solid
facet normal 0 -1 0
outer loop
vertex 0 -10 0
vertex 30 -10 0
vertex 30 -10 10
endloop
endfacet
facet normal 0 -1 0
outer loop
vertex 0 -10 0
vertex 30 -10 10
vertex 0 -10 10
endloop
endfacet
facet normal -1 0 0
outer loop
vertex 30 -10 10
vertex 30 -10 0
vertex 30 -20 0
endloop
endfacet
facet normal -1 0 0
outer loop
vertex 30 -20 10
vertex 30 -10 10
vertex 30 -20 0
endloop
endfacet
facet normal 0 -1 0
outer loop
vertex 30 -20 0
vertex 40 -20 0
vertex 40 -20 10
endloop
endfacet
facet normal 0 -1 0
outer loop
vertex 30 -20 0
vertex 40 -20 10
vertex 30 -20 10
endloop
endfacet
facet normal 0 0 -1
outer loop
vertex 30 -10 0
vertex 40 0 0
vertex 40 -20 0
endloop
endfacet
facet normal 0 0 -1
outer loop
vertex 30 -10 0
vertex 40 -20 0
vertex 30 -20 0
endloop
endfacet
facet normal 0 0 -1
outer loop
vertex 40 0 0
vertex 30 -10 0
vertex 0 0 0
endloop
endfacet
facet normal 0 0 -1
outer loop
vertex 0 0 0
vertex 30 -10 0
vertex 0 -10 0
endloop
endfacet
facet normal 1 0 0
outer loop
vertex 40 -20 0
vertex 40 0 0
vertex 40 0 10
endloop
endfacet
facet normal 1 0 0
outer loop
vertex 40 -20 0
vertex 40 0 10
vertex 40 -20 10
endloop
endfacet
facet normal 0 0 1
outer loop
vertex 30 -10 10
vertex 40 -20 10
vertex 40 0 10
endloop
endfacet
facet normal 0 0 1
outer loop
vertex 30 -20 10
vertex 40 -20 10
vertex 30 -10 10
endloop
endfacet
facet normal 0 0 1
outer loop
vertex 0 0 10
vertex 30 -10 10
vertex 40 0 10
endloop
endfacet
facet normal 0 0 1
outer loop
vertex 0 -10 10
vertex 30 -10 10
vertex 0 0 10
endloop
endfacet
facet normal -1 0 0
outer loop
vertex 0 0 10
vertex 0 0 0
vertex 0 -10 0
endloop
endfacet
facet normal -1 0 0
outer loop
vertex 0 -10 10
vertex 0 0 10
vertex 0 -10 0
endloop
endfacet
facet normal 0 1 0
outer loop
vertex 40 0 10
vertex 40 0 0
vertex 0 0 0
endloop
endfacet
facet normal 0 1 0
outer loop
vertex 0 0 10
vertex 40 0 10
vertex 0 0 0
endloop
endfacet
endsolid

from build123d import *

# Parameters (mm, degrees)
BOX017_W                     = 10
BOX017_H                     = 10
BOX017_DEPTH                 = 10
BOX018_W                     = 10
BOX018_H                     = 10
BOX018_DEPTH                 = 10
BOX019_W                     = 10
BOX019_H                     = 10
BOX019_DEPTH                 = 10
BOX021_W                     = 10
BOX021_H                     = 10
BOX021_DEPTH                 = 10
BOX020_W                     = 10
BOX020_H                     = 10
BOX020_DEPTH                 = 10
FUSION002004_PLACEMENT_ANGLE = 180


with BuildPart() as cubo017:
    # Box017 → Box017 (new body)
    with BuildSketch(Plane(origin=(30, 0, 0), x_dir=(1, 0, 0), z_dir=(0, 0, 1))):
        with Locations((5, 5)):
            Rectangle(BOX017_W, BOX017_H)
    extrude(amount=BOX017_DEPTH)


with BuildPart() as cubo018:
    # Box018 → Box018 (new body)
    with BuildSketch(Plane(origin=(10, 0, 0), x_dir=(1, 0, 0), z_dir=(0, 0, 1))):
        with Locations((5, 5)):
            Rectangle(BOX018_W, BOX018_H)
    extrude(amount=BOX018_DEPTH)


with BuildPart() as cubo019:
    # Box019 → Box019 (new body)
    with BuildSketch(Plane(origin=(20, 0, 0), x_dir=(1, 0, 0), z_dir=(0, 0, 1))):
        with Locations((5, 5)):
            Rectangle(BOX019_W, BOX019_H)
    extrude(amount=BOX019_DEPTH)


with BuildPart() as cubo021:
    # Box021 → Box021 (new body)
    with BuildSketch(Plane(origin=(0, 10, 0), x_dir=(1, 0, 0), z_dir=(0, 0, 1))):
        with Locations((5, 5)):
            Rectangle(BOX021_W, BOX021_H)
    extrude(amount=BOX021_DEPTH)


with BuildPart() as fusion002004:
    # Box020 → Box020 (new body)
    with BuildSketch(Plane.XY):
        with Locations((5, 5)):
            Rectangle(BOX020_W, BOX020_H)
    extrude(amount=BOX020_DEPTH)

    # Fusion002004: union Cubo017, Cubo018, Cubo019, Cubo021
    add(cubo017.part)
    add(cubo018.part)
    add(cubo019.part)
    add(cubo021.part)


with BuildPart() as fusion002004_1:
    # Fusion002004 placement: moved
    add(fusion002004.part.moved(Location((40, 0, 0))).rotate(Axis((40, 0, 0), (0, 0, 1)), FUSION002004_PLACEMENT_ANGLE))


solid = fusion002004_1.part
